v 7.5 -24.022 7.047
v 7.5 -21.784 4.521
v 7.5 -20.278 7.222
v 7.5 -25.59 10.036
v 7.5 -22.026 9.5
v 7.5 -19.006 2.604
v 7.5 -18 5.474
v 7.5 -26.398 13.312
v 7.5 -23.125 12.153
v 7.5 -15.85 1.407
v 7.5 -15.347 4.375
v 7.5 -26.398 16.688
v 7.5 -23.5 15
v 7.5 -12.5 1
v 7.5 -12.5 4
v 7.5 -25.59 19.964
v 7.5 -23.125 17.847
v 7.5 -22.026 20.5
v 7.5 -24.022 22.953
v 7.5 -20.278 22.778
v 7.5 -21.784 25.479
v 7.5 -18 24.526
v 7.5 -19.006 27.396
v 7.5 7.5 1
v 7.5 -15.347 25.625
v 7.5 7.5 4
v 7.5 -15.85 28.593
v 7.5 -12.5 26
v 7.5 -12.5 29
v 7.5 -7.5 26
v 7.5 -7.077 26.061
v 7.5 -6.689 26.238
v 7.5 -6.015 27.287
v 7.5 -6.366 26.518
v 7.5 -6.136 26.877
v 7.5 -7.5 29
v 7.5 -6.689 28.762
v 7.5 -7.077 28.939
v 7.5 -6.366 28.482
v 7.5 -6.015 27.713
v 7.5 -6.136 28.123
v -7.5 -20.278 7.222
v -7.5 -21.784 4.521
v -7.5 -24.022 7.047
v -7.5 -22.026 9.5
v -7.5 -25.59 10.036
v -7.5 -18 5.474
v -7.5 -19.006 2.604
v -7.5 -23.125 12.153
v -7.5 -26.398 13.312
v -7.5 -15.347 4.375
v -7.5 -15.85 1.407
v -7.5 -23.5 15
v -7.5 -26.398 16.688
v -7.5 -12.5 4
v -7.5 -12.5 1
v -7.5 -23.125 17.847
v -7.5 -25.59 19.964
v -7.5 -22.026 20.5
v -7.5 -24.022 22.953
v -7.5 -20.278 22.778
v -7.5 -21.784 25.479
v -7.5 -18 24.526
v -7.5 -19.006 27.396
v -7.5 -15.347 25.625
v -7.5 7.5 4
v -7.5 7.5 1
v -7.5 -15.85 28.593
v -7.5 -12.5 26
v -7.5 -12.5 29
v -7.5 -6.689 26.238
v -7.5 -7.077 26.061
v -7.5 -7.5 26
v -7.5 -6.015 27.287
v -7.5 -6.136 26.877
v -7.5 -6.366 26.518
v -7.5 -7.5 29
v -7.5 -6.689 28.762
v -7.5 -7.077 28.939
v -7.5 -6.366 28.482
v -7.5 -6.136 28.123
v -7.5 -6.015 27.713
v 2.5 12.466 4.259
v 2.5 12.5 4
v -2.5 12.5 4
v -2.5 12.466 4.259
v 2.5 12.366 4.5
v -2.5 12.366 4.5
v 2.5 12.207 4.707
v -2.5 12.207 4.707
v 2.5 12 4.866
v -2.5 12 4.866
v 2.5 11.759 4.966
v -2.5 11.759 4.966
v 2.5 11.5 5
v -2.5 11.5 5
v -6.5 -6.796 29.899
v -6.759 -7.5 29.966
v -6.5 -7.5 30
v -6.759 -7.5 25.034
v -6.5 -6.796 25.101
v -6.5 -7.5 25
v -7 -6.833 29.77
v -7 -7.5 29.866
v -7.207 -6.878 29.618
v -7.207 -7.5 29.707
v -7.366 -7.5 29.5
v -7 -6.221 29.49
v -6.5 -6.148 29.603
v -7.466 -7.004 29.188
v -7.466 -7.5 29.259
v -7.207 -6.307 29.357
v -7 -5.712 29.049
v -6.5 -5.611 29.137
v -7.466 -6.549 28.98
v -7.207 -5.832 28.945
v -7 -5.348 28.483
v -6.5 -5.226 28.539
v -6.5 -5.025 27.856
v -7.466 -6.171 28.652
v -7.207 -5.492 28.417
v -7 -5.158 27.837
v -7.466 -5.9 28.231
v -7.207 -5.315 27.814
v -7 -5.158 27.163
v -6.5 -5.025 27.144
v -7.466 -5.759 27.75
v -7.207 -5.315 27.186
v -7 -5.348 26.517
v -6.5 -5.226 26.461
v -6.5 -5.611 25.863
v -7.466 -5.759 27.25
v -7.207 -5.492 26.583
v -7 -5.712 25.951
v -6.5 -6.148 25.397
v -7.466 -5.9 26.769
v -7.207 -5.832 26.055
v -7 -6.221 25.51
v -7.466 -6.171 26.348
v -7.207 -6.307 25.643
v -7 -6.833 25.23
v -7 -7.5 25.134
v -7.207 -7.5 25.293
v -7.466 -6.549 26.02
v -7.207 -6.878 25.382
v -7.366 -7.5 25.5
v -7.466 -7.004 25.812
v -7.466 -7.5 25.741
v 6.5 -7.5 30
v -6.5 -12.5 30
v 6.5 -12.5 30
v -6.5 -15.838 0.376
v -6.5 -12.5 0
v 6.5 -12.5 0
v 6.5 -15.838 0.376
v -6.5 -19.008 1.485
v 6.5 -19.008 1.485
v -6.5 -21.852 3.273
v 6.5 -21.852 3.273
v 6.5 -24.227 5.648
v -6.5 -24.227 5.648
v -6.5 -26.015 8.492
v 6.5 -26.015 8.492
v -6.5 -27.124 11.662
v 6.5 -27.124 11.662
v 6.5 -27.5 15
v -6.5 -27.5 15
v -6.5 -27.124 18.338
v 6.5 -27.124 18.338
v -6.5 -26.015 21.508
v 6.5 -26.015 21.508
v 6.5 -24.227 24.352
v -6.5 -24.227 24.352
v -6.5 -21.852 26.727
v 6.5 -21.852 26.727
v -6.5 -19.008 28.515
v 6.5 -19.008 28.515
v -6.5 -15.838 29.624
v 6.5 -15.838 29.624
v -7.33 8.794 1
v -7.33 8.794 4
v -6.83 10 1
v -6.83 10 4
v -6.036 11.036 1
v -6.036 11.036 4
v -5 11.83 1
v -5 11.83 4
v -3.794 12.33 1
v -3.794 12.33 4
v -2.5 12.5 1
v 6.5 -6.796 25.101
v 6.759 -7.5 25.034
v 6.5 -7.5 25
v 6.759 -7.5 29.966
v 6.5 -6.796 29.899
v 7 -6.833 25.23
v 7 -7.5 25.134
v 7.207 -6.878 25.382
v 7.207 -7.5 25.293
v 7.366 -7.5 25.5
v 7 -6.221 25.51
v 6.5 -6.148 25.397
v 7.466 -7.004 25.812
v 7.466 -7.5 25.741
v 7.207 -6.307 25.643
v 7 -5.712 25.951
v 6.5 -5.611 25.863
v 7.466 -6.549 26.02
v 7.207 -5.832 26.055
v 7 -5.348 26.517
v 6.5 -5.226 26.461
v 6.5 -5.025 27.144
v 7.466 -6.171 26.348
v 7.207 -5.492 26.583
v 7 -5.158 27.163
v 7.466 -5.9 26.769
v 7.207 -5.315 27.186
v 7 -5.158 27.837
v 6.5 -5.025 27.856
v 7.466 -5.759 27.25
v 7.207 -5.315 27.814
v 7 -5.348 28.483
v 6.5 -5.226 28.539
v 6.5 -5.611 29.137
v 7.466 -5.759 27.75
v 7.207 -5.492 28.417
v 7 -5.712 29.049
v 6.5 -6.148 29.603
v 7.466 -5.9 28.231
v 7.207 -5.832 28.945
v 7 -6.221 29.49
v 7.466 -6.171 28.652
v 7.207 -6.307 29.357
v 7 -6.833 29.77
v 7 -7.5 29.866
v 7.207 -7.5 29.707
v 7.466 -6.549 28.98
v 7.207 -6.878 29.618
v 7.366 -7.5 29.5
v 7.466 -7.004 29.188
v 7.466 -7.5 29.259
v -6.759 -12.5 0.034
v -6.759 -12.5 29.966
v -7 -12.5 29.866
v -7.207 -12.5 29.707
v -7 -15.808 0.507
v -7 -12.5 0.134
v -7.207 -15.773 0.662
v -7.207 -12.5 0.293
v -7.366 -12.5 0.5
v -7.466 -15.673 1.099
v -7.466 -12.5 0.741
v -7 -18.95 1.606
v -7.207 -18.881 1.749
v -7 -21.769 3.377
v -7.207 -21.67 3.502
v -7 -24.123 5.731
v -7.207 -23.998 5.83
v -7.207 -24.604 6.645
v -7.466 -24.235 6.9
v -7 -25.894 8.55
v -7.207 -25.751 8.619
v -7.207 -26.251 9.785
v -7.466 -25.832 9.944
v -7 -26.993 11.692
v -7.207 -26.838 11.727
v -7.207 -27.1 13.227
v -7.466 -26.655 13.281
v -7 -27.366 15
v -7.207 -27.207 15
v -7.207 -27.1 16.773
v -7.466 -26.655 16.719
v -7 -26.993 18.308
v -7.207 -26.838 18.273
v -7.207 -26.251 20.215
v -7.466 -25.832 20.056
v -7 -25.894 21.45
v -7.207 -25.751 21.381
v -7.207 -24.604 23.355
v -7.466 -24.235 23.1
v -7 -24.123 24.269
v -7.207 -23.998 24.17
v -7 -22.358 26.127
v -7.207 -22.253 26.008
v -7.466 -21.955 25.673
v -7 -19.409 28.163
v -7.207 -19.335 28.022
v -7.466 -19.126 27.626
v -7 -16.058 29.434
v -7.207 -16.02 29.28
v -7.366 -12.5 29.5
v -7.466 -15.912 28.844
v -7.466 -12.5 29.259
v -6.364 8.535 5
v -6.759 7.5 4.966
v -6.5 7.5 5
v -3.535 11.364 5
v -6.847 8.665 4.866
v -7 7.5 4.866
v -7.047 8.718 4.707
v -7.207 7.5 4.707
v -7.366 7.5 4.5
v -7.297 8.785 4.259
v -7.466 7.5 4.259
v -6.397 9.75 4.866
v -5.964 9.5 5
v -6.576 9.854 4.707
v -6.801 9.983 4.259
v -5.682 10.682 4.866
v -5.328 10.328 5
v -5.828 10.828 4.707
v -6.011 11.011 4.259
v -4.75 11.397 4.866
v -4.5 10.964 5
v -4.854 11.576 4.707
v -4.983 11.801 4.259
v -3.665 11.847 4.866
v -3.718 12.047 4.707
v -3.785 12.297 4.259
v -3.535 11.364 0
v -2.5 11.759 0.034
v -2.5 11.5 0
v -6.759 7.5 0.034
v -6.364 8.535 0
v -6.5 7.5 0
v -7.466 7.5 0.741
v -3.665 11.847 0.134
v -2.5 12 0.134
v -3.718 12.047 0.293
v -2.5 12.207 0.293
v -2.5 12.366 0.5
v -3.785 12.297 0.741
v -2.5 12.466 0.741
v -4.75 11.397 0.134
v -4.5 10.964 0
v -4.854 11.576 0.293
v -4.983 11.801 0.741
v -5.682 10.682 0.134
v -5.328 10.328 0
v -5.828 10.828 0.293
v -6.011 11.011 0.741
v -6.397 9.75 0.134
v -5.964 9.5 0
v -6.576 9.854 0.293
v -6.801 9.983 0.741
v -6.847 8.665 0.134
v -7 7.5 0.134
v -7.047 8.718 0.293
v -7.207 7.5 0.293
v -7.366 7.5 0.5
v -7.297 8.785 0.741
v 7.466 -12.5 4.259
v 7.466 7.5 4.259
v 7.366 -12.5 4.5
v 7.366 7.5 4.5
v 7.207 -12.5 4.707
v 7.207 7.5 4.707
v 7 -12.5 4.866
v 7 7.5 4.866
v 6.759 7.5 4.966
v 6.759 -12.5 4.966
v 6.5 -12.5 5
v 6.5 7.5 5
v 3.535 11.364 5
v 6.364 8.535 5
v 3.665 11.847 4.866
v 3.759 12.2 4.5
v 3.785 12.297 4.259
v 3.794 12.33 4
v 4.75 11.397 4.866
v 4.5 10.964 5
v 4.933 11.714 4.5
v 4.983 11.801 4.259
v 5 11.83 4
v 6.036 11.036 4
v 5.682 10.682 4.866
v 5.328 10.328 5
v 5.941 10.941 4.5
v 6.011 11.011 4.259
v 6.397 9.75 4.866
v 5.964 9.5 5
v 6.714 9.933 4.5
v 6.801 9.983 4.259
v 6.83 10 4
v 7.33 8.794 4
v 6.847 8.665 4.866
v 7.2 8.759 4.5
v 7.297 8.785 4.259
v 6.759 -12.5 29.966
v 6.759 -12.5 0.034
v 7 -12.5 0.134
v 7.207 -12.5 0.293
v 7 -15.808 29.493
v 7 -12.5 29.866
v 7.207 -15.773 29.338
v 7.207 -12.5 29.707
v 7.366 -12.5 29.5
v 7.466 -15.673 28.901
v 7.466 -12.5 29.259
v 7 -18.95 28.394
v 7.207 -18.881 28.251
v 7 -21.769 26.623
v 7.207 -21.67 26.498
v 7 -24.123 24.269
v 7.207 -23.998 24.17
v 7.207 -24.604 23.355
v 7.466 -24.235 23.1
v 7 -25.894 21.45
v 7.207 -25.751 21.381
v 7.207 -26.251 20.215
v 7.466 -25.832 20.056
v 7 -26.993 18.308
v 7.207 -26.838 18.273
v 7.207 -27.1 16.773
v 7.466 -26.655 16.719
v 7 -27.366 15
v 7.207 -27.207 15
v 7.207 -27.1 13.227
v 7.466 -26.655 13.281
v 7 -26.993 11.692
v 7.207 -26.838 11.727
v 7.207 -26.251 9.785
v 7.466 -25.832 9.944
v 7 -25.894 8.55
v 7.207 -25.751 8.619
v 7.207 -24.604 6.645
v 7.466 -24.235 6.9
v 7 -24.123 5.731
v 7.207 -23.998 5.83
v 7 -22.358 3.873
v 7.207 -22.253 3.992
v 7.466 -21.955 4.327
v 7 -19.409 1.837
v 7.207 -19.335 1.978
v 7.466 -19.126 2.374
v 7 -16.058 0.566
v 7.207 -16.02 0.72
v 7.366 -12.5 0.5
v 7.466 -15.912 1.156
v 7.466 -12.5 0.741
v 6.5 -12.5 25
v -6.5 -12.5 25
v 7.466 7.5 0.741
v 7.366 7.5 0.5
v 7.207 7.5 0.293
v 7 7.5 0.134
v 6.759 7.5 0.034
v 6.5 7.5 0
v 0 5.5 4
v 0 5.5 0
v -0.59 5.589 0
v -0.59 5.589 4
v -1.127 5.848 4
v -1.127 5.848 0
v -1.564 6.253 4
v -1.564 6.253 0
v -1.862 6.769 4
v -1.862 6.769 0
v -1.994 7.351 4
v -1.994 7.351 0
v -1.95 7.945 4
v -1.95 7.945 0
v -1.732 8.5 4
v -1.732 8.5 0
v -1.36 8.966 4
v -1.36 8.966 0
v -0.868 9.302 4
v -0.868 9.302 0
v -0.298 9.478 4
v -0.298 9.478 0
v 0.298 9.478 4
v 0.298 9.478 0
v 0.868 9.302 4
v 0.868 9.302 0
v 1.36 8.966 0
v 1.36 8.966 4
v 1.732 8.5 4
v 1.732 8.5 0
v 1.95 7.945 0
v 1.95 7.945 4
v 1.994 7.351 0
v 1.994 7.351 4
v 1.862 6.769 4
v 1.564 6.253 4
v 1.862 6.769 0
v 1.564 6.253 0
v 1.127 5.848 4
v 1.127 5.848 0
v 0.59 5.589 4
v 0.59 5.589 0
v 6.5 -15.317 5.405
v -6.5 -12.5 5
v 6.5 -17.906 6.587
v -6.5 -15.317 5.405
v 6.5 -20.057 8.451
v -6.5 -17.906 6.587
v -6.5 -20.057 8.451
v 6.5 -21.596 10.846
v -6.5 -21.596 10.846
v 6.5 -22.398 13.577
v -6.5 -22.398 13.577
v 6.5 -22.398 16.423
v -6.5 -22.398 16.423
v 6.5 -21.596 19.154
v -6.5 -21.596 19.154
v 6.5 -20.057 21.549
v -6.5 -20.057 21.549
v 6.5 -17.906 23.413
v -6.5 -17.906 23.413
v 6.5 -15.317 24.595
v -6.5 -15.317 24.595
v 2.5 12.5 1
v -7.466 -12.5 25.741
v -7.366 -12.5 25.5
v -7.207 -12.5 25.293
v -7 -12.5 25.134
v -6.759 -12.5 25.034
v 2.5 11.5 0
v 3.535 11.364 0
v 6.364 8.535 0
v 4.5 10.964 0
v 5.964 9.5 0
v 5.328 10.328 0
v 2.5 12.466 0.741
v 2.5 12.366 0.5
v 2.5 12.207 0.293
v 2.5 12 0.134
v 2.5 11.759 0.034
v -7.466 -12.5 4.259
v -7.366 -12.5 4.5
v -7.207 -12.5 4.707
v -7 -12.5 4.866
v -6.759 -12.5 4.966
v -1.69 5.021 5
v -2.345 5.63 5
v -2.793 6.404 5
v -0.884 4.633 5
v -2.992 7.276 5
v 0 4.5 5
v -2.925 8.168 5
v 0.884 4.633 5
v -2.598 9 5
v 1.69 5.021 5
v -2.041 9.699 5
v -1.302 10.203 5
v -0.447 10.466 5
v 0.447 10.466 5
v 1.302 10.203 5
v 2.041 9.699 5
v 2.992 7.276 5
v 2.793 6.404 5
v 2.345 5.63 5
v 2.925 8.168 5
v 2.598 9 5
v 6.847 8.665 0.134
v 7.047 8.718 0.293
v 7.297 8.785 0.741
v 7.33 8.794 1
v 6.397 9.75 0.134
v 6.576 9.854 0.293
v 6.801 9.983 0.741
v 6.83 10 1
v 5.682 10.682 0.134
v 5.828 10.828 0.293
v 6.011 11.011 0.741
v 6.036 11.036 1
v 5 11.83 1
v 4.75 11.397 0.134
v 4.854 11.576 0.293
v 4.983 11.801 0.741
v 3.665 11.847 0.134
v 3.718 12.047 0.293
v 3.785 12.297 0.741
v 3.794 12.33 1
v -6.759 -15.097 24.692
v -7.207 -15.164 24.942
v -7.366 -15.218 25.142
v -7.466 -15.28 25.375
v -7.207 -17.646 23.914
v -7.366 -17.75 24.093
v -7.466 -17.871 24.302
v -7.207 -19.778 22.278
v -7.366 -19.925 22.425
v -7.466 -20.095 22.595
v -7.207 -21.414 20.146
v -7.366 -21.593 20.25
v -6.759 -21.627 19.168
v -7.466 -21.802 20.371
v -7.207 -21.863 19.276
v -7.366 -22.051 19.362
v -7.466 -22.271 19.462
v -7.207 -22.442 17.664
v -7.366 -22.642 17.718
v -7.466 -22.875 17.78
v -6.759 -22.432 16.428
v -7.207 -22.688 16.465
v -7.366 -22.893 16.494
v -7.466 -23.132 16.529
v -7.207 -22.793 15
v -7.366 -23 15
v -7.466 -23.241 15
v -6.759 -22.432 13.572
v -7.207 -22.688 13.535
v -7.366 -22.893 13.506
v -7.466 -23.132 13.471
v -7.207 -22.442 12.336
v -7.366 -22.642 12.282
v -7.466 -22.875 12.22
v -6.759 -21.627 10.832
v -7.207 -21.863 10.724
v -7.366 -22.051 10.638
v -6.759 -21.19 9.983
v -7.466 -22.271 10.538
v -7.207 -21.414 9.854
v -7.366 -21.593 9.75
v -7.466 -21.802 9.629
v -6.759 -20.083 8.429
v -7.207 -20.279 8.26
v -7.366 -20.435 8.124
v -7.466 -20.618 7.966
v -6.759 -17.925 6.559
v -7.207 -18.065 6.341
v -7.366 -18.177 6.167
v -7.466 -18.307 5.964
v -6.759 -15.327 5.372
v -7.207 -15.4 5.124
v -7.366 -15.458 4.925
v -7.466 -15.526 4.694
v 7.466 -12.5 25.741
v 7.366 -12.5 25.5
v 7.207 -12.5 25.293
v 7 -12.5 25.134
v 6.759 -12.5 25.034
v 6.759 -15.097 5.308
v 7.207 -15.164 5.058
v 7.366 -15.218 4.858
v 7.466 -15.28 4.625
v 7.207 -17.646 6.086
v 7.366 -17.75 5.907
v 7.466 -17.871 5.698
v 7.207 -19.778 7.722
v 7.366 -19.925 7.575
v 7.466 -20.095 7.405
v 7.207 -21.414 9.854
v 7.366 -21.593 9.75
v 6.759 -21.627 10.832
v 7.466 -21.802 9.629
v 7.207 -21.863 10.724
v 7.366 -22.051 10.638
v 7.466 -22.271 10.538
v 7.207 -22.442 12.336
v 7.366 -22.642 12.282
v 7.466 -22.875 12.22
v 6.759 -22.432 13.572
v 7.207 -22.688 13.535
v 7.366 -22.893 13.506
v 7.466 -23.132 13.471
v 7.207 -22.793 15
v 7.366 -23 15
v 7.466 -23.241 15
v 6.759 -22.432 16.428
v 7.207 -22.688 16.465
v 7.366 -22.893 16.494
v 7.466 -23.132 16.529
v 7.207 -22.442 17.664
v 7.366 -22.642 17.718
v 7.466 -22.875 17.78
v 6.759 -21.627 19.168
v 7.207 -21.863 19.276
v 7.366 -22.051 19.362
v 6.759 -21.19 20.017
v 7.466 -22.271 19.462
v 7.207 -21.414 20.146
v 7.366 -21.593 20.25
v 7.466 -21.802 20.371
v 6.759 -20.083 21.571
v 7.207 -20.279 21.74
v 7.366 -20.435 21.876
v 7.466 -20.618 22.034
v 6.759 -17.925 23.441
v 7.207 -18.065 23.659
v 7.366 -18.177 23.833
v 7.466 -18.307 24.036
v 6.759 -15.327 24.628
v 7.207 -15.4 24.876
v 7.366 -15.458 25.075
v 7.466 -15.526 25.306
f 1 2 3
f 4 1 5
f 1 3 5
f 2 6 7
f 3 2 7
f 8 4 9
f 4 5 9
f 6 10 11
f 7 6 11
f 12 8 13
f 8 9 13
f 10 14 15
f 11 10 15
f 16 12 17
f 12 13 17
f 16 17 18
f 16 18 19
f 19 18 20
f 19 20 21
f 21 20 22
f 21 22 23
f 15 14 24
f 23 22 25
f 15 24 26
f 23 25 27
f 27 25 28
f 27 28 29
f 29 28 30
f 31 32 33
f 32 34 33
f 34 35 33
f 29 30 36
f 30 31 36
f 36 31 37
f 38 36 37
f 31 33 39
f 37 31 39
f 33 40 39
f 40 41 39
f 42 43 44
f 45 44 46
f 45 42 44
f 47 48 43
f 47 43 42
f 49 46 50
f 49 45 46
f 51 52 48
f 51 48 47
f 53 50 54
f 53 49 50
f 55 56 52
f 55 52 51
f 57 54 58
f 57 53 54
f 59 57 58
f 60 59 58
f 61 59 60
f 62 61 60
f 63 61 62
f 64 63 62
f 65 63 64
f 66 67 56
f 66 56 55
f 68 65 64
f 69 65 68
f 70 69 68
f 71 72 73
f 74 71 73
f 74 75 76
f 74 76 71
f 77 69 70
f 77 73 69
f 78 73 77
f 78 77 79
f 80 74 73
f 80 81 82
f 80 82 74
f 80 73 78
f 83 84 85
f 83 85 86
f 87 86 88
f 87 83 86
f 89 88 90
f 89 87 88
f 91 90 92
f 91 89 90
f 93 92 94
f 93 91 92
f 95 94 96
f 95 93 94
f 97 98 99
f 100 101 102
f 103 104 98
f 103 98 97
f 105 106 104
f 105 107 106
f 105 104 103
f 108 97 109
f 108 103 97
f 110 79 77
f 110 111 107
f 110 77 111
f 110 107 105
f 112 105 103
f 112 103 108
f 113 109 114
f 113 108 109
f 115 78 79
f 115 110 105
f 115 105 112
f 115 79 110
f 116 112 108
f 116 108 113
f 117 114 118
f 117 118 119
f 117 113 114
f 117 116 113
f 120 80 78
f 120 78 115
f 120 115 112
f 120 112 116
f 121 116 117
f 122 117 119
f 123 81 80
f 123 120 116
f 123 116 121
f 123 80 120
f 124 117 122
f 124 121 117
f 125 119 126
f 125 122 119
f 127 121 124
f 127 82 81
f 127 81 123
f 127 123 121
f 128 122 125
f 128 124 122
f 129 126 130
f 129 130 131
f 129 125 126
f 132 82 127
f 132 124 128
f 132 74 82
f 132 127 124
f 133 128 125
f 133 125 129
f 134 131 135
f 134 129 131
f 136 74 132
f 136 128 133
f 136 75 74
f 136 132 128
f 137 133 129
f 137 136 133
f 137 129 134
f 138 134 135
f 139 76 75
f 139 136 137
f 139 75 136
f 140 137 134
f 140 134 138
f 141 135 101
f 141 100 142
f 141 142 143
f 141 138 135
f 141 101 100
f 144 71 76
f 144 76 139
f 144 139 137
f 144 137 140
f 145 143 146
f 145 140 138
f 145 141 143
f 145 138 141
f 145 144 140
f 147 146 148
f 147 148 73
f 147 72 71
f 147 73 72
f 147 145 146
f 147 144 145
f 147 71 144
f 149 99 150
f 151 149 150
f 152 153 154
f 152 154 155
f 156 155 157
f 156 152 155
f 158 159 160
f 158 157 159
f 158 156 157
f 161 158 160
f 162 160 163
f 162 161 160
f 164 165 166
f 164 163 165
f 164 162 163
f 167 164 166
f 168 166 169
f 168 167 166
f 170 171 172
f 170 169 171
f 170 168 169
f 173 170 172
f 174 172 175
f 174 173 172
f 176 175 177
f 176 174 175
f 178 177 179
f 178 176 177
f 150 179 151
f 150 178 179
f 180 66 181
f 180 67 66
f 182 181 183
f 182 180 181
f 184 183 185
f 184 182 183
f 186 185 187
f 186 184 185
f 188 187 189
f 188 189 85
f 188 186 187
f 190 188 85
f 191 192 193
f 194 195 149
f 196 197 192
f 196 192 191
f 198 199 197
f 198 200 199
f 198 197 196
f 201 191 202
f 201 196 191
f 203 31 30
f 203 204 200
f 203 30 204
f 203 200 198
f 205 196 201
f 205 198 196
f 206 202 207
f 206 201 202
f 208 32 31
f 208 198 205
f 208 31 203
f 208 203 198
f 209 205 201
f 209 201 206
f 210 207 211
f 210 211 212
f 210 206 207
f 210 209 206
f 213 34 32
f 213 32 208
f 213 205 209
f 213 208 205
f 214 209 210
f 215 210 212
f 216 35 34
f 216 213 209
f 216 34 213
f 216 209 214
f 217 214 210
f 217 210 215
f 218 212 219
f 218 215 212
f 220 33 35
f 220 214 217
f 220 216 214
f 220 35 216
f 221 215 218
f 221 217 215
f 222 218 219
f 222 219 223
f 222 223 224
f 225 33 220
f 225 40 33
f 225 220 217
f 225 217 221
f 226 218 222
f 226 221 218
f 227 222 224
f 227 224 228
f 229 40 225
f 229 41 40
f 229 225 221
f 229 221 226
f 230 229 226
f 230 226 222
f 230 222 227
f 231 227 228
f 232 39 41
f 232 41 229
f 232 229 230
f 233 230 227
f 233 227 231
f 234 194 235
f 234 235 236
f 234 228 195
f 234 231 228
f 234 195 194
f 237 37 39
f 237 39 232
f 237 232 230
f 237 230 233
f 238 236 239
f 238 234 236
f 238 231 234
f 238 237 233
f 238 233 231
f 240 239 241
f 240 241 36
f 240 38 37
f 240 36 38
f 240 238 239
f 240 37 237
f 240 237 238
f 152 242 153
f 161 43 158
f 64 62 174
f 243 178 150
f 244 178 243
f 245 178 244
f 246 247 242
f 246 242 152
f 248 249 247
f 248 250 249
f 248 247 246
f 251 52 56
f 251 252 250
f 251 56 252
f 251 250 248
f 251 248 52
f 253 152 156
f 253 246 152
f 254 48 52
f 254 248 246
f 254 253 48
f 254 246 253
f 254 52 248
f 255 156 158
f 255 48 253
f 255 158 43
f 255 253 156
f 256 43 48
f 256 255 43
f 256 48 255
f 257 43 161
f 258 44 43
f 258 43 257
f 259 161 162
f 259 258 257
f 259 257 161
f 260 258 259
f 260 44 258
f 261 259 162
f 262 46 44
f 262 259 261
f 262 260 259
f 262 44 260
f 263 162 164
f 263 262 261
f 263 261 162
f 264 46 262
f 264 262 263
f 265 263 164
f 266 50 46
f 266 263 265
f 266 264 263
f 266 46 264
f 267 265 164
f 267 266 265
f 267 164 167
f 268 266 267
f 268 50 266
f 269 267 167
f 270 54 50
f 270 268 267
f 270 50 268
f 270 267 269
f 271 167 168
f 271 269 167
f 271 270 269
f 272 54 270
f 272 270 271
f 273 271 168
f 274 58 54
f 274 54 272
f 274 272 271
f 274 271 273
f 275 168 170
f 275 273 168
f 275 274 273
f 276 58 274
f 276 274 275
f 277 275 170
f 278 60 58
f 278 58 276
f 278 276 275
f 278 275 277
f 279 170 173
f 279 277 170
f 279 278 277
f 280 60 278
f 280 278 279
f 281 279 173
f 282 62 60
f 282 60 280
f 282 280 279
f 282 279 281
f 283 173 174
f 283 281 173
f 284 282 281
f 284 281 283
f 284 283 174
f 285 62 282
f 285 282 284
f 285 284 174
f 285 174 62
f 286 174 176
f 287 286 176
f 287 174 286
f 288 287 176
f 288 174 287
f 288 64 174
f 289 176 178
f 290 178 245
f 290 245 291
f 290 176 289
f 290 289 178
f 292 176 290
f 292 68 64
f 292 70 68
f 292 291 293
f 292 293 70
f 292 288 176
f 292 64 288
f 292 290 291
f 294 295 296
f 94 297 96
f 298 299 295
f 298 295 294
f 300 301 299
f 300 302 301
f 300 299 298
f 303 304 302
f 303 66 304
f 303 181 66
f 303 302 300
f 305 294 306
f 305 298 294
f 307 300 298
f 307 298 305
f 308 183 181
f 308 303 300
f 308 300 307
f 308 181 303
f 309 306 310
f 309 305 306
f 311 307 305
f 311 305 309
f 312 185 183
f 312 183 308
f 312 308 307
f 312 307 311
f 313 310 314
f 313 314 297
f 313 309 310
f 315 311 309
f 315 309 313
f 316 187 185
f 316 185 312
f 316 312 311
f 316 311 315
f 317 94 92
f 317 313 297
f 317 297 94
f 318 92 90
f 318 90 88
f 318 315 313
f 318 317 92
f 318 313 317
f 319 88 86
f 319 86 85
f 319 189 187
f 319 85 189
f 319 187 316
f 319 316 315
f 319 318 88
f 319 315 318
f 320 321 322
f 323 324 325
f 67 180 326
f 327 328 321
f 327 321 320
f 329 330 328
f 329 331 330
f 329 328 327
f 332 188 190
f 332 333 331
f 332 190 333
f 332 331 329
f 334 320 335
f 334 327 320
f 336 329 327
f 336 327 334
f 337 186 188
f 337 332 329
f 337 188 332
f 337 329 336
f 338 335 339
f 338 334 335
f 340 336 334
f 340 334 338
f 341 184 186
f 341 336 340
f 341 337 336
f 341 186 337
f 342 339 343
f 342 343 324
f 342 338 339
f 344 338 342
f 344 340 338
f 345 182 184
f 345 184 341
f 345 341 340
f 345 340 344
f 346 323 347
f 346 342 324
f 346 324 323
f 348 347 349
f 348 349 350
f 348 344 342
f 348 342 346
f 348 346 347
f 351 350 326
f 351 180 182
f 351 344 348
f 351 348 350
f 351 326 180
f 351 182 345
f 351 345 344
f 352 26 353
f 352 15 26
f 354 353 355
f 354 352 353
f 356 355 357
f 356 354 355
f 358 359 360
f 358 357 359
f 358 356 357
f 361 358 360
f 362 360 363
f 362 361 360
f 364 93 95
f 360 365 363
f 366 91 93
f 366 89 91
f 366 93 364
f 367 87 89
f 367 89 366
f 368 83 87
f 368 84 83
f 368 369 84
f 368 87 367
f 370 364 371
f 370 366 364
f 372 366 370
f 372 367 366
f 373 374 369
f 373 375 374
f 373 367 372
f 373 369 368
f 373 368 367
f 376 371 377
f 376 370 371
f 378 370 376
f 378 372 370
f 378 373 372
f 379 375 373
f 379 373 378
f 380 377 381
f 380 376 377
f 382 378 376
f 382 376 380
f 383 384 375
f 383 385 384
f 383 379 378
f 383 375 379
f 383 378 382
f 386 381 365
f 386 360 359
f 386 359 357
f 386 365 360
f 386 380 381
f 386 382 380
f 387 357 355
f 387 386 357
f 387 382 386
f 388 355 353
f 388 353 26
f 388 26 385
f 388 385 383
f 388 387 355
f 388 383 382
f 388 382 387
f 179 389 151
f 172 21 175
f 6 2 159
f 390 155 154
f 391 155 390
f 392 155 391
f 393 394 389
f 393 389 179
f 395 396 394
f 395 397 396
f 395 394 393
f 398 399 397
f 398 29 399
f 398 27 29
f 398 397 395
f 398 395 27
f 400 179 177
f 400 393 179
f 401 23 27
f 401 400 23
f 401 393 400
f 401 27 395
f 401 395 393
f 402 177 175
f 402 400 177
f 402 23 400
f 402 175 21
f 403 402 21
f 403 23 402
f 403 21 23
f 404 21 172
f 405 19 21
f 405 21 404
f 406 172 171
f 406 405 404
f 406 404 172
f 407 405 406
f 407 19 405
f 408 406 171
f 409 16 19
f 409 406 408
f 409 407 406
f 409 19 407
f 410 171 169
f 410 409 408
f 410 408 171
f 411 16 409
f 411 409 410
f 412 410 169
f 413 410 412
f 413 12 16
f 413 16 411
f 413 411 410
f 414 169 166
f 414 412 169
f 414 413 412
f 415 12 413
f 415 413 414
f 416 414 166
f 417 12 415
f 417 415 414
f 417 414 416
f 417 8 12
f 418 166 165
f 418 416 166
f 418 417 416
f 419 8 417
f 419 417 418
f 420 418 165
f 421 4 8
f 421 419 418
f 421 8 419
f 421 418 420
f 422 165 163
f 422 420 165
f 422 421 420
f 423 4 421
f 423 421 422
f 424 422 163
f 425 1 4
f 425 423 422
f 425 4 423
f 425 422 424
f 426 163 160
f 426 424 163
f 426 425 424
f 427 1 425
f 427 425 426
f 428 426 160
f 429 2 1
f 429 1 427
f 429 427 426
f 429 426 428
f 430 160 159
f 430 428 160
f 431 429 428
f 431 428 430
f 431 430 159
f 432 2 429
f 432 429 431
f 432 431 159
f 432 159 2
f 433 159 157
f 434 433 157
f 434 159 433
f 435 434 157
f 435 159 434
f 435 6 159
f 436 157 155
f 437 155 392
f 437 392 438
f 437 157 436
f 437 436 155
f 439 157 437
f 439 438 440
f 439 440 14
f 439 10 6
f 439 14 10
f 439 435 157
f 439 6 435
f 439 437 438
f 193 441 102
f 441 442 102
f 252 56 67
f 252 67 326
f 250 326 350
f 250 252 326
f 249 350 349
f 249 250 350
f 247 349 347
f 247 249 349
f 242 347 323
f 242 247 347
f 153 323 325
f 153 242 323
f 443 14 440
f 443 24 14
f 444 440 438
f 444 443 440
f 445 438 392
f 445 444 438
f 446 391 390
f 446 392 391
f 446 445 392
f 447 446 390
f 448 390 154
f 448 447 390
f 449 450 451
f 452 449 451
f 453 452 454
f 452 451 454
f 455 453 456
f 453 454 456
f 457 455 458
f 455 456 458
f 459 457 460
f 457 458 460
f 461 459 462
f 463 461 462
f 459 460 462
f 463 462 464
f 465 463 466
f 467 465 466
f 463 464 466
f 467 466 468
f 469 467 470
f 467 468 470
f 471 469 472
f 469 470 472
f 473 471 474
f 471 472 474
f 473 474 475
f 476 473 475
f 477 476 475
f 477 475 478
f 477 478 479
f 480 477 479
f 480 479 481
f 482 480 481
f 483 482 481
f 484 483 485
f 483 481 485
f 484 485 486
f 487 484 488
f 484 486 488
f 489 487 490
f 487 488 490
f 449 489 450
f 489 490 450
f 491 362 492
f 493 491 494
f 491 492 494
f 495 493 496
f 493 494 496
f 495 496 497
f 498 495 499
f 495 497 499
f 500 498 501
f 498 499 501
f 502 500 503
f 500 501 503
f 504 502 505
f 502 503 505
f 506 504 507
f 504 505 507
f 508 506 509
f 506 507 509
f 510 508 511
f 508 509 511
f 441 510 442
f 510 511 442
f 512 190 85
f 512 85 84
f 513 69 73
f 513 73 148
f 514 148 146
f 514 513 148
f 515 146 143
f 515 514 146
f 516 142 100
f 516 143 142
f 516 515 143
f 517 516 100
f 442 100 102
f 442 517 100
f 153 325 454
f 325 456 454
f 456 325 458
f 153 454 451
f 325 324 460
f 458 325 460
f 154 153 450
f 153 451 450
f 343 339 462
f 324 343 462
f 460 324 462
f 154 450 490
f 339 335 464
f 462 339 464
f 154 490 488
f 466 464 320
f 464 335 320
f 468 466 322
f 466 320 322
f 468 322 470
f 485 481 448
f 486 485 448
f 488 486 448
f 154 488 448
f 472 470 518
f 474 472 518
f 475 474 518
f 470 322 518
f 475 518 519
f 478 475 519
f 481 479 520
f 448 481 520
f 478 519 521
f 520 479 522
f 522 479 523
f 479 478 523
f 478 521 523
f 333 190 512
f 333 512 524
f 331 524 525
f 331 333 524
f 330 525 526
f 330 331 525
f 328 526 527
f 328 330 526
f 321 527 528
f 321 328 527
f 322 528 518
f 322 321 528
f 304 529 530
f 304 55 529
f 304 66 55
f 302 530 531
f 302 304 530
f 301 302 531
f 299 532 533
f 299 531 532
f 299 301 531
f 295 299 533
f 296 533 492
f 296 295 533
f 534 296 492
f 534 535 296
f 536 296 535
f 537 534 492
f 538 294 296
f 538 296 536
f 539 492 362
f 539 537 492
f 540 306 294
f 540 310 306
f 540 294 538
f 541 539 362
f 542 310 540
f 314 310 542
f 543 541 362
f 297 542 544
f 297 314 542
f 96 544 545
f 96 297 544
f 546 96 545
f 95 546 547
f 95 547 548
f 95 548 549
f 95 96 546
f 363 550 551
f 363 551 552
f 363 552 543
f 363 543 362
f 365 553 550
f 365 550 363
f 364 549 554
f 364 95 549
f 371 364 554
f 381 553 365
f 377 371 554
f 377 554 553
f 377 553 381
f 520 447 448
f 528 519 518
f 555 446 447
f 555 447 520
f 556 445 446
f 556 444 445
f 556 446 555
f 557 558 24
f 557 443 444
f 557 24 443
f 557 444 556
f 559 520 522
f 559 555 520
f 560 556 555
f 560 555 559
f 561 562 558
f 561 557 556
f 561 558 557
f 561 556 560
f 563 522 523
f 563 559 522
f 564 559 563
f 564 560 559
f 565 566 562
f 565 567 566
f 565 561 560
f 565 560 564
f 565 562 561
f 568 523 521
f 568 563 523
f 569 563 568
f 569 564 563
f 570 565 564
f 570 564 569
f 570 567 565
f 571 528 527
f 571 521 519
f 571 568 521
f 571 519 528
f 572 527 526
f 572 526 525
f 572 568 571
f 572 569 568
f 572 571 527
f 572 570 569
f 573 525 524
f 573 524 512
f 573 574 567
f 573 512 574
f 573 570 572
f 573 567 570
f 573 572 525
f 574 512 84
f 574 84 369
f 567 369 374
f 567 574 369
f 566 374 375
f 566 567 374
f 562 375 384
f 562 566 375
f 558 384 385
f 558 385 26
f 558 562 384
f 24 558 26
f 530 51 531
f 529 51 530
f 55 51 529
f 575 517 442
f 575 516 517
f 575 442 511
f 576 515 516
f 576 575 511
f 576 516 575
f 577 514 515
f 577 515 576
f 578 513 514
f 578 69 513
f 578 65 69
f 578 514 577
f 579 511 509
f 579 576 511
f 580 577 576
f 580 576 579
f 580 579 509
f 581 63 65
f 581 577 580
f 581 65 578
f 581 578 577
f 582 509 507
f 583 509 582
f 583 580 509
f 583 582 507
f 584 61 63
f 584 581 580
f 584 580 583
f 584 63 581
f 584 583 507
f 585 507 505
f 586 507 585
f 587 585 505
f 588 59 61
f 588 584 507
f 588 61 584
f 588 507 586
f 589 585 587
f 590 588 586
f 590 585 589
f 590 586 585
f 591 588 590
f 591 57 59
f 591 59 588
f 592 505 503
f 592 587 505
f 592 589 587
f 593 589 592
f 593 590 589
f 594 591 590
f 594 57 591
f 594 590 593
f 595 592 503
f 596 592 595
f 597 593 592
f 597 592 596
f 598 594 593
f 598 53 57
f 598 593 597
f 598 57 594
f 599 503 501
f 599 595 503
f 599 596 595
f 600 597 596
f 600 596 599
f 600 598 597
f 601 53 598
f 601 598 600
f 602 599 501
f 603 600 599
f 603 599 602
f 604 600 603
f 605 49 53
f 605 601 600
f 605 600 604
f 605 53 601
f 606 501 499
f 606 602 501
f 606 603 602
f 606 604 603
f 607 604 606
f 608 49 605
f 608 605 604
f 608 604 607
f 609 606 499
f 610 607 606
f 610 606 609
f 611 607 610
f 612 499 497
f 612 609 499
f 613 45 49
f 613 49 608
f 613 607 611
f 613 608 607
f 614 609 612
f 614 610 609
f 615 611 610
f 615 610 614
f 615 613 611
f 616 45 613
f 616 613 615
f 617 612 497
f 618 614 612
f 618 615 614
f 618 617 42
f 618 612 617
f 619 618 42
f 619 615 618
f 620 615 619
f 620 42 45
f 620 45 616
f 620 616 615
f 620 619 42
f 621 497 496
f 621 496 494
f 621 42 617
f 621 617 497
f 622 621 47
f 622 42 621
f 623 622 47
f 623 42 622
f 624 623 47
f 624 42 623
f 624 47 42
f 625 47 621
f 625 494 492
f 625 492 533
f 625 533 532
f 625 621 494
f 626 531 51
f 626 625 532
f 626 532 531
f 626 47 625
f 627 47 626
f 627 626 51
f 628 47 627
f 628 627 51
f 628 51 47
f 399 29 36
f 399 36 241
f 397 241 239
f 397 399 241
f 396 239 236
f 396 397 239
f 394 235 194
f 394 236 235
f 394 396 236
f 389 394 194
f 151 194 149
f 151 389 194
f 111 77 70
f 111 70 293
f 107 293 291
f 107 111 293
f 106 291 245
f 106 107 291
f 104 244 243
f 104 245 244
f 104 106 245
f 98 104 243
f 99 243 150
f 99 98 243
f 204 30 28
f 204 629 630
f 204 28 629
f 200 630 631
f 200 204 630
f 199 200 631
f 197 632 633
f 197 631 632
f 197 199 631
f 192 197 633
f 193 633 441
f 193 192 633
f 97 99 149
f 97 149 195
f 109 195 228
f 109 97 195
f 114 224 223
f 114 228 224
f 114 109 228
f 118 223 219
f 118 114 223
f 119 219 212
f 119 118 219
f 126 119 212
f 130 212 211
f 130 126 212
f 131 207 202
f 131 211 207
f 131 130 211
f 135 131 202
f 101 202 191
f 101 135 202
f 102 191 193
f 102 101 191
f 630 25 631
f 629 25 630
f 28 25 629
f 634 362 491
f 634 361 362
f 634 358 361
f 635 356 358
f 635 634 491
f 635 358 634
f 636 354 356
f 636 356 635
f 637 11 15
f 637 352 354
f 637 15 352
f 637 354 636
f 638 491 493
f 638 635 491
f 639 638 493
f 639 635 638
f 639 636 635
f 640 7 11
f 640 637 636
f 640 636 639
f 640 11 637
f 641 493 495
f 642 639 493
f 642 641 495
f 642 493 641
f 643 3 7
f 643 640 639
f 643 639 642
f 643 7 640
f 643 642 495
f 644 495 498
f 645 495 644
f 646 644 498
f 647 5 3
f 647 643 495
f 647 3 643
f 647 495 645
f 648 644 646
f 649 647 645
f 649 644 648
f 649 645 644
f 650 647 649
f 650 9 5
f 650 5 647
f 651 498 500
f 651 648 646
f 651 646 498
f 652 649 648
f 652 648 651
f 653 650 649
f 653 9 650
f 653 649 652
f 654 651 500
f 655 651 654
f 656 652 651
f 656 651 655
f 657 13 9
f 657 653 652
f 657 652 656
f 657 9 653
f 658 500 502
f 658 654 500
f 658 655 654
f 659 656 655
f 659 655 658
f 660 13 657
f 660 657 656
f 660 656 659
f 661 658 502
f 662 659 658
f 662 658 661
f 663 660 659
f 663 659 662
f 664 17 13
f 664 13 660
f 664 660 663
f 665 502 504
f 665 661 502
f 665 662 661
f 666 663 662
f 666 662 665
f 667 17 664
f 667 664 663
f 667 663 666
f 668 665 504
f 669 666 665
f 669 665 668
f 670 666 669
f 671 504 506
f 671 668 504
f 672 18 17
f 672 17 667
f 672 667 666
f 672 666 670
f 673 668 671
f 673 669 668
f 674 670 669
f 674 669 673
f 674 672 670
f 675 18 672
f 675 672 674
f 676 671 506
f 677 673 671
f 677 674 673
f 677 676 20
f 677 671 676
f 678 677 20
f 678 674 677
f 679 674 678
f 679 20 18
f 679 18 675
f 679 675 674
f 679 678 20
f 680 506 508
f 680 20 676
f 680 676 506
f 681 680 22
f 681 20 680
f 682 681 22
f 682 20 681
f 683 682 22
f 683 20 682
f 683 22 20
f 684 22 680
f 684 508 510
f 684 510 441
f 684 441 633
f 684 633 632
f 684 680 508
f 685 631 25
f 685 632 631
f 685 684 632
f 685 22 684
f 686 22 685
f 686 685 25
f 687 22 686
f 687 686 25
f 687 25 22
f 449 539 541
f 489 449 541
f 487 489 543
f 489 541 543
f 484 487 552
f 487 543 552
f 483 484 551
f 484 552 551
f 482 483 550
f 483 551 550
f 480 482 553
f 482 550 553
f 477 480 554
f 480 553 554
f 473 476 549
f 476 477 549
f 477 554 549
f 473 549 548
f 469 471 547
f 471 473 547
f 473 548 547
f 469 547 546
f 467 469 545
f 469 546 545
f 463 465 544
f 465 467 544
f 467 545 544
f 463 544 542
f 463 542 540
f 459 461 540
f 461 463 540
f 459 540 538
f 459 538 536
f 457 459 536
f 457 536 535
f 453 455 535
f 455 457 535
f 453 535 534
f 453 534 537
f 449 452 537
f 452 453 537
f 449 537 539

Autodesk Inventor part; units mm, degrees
ref_plane "YZ Plane" through (0, 0, 0) normal (1, 0, 0) x (0, 1, 0)
ref_plane "XZ Plane" through (0, 0, 0) normal (0, 1, 0) x (-1, 0, 0)
ref_plane "XY Plane" through (0, 0, 0) normal (0, 0, 1) x (1, 0, 0)
sketch "Sketch1" plane through (0, 0, 0) normal (0, 0, 1) x (1, 0, 0)
  line L0 (-2.5, 12.5) -> (2.5, 12.5)
  line L1 (7.5, 7.5) -> (7.5, -12.5)
  line L2 (7.5, -12.5) -> (-7.5, -12.5)
  line L3 (-7.5, -12.5) -> (-7.5, 7.5)
  line L4 (-7.5, 12.5) -> (7.5, -12.5) construction
  line L5 (7.5, 12.5) -> (-7.5, -12.5) construction
  arc A0 (-2.5, 12.5) -> (-7.5, 7.5) centre (-2.5, 7.5) ccw
  arc A1 (7.5, 7.5) -> (2.5, 12.5) centre (2.5, 7.5) ccw
  circle A2 centre (0, 7.5) radius 1.5
  point P0 (0, 0)
  dimension "d0" = 15
  dimension "d3" = 5
  dimension "d4" = 3
  dimension "d5" = 5
  dimension "HOOK_HEIGHT" = 20
extrude "Extrusion2" add sketch "Sketch1" along normal blind 5
sketch "Sketch2" plane through (0, 0, 5) normal (0, 0, 1) x (1, 0, 0)
  circle A0 centre (0, 7.5) radius 1.5 projected
  point P0 (0, 0)
hole "Hole1" at (0, 7.5, 5) direction (0, 0, -1) diameter 4 end through all countersink diameter 6 countersink angle 90
sketch "Sketch3" plane through (-7.5, -12.5, 0) normal (-1, 0, 0) x (0, 0, 1)
  line L0 (0, 0) -> (5, 0)
  line L1 (2.5, 0) -> (2.5, -6.8079) construction
  arc A0 (0, 0) -> (30, 0) centre (15, 0) ccw
  line L2 (5, 20) -> (5, 0) construction
  line L3 (0, 20) -> (0, 0) construction
  arc A1 (5, 0) -> (25, 0) centre (15, 0) ccw
  line L4 (25, 0) -> (25, 5)
  line L5 (30, 5) -> (30, 0)
  arc A2 (30, 5) -> (25, 5) centre (27.5, 5) ccw
  point P0 (0, 12.5)
  dimension "HOOK_RADIUS" = 30
  dimension "d16" = 5
  dimension "HOOK_LEN" = 5
  dimension "d18" = 5
extrude "Extrusion3" add sketch "Sketch3" against normal up to surface (15 mm away)
fillet "Fillet1" radius 1 18 edges at (7.5, -2.5, 5) (6.0355, 11.0355, 5) (0, 12.5, 5) (-6.0355, 11.0355, 5) (-7.5, -2.5, 5) (-7.5, -22.5, 15) (-7.5, -10, 25) (-7.5, -5, 27.5) (-7.5, -10, 30) (-7.5, -27.5, 15) (-7.5, -2.5, 0) (-6.0355, 11.0355, 0) (0, 12.5, 0) (6.0355, 11.0355, 0) (7.5, -2.5, 0) (7.5, -10, 30) (7.5, -5, 27.5) (7.5, -10, 25)
properties part number "curved_single_hook" material "PET Plastic"
